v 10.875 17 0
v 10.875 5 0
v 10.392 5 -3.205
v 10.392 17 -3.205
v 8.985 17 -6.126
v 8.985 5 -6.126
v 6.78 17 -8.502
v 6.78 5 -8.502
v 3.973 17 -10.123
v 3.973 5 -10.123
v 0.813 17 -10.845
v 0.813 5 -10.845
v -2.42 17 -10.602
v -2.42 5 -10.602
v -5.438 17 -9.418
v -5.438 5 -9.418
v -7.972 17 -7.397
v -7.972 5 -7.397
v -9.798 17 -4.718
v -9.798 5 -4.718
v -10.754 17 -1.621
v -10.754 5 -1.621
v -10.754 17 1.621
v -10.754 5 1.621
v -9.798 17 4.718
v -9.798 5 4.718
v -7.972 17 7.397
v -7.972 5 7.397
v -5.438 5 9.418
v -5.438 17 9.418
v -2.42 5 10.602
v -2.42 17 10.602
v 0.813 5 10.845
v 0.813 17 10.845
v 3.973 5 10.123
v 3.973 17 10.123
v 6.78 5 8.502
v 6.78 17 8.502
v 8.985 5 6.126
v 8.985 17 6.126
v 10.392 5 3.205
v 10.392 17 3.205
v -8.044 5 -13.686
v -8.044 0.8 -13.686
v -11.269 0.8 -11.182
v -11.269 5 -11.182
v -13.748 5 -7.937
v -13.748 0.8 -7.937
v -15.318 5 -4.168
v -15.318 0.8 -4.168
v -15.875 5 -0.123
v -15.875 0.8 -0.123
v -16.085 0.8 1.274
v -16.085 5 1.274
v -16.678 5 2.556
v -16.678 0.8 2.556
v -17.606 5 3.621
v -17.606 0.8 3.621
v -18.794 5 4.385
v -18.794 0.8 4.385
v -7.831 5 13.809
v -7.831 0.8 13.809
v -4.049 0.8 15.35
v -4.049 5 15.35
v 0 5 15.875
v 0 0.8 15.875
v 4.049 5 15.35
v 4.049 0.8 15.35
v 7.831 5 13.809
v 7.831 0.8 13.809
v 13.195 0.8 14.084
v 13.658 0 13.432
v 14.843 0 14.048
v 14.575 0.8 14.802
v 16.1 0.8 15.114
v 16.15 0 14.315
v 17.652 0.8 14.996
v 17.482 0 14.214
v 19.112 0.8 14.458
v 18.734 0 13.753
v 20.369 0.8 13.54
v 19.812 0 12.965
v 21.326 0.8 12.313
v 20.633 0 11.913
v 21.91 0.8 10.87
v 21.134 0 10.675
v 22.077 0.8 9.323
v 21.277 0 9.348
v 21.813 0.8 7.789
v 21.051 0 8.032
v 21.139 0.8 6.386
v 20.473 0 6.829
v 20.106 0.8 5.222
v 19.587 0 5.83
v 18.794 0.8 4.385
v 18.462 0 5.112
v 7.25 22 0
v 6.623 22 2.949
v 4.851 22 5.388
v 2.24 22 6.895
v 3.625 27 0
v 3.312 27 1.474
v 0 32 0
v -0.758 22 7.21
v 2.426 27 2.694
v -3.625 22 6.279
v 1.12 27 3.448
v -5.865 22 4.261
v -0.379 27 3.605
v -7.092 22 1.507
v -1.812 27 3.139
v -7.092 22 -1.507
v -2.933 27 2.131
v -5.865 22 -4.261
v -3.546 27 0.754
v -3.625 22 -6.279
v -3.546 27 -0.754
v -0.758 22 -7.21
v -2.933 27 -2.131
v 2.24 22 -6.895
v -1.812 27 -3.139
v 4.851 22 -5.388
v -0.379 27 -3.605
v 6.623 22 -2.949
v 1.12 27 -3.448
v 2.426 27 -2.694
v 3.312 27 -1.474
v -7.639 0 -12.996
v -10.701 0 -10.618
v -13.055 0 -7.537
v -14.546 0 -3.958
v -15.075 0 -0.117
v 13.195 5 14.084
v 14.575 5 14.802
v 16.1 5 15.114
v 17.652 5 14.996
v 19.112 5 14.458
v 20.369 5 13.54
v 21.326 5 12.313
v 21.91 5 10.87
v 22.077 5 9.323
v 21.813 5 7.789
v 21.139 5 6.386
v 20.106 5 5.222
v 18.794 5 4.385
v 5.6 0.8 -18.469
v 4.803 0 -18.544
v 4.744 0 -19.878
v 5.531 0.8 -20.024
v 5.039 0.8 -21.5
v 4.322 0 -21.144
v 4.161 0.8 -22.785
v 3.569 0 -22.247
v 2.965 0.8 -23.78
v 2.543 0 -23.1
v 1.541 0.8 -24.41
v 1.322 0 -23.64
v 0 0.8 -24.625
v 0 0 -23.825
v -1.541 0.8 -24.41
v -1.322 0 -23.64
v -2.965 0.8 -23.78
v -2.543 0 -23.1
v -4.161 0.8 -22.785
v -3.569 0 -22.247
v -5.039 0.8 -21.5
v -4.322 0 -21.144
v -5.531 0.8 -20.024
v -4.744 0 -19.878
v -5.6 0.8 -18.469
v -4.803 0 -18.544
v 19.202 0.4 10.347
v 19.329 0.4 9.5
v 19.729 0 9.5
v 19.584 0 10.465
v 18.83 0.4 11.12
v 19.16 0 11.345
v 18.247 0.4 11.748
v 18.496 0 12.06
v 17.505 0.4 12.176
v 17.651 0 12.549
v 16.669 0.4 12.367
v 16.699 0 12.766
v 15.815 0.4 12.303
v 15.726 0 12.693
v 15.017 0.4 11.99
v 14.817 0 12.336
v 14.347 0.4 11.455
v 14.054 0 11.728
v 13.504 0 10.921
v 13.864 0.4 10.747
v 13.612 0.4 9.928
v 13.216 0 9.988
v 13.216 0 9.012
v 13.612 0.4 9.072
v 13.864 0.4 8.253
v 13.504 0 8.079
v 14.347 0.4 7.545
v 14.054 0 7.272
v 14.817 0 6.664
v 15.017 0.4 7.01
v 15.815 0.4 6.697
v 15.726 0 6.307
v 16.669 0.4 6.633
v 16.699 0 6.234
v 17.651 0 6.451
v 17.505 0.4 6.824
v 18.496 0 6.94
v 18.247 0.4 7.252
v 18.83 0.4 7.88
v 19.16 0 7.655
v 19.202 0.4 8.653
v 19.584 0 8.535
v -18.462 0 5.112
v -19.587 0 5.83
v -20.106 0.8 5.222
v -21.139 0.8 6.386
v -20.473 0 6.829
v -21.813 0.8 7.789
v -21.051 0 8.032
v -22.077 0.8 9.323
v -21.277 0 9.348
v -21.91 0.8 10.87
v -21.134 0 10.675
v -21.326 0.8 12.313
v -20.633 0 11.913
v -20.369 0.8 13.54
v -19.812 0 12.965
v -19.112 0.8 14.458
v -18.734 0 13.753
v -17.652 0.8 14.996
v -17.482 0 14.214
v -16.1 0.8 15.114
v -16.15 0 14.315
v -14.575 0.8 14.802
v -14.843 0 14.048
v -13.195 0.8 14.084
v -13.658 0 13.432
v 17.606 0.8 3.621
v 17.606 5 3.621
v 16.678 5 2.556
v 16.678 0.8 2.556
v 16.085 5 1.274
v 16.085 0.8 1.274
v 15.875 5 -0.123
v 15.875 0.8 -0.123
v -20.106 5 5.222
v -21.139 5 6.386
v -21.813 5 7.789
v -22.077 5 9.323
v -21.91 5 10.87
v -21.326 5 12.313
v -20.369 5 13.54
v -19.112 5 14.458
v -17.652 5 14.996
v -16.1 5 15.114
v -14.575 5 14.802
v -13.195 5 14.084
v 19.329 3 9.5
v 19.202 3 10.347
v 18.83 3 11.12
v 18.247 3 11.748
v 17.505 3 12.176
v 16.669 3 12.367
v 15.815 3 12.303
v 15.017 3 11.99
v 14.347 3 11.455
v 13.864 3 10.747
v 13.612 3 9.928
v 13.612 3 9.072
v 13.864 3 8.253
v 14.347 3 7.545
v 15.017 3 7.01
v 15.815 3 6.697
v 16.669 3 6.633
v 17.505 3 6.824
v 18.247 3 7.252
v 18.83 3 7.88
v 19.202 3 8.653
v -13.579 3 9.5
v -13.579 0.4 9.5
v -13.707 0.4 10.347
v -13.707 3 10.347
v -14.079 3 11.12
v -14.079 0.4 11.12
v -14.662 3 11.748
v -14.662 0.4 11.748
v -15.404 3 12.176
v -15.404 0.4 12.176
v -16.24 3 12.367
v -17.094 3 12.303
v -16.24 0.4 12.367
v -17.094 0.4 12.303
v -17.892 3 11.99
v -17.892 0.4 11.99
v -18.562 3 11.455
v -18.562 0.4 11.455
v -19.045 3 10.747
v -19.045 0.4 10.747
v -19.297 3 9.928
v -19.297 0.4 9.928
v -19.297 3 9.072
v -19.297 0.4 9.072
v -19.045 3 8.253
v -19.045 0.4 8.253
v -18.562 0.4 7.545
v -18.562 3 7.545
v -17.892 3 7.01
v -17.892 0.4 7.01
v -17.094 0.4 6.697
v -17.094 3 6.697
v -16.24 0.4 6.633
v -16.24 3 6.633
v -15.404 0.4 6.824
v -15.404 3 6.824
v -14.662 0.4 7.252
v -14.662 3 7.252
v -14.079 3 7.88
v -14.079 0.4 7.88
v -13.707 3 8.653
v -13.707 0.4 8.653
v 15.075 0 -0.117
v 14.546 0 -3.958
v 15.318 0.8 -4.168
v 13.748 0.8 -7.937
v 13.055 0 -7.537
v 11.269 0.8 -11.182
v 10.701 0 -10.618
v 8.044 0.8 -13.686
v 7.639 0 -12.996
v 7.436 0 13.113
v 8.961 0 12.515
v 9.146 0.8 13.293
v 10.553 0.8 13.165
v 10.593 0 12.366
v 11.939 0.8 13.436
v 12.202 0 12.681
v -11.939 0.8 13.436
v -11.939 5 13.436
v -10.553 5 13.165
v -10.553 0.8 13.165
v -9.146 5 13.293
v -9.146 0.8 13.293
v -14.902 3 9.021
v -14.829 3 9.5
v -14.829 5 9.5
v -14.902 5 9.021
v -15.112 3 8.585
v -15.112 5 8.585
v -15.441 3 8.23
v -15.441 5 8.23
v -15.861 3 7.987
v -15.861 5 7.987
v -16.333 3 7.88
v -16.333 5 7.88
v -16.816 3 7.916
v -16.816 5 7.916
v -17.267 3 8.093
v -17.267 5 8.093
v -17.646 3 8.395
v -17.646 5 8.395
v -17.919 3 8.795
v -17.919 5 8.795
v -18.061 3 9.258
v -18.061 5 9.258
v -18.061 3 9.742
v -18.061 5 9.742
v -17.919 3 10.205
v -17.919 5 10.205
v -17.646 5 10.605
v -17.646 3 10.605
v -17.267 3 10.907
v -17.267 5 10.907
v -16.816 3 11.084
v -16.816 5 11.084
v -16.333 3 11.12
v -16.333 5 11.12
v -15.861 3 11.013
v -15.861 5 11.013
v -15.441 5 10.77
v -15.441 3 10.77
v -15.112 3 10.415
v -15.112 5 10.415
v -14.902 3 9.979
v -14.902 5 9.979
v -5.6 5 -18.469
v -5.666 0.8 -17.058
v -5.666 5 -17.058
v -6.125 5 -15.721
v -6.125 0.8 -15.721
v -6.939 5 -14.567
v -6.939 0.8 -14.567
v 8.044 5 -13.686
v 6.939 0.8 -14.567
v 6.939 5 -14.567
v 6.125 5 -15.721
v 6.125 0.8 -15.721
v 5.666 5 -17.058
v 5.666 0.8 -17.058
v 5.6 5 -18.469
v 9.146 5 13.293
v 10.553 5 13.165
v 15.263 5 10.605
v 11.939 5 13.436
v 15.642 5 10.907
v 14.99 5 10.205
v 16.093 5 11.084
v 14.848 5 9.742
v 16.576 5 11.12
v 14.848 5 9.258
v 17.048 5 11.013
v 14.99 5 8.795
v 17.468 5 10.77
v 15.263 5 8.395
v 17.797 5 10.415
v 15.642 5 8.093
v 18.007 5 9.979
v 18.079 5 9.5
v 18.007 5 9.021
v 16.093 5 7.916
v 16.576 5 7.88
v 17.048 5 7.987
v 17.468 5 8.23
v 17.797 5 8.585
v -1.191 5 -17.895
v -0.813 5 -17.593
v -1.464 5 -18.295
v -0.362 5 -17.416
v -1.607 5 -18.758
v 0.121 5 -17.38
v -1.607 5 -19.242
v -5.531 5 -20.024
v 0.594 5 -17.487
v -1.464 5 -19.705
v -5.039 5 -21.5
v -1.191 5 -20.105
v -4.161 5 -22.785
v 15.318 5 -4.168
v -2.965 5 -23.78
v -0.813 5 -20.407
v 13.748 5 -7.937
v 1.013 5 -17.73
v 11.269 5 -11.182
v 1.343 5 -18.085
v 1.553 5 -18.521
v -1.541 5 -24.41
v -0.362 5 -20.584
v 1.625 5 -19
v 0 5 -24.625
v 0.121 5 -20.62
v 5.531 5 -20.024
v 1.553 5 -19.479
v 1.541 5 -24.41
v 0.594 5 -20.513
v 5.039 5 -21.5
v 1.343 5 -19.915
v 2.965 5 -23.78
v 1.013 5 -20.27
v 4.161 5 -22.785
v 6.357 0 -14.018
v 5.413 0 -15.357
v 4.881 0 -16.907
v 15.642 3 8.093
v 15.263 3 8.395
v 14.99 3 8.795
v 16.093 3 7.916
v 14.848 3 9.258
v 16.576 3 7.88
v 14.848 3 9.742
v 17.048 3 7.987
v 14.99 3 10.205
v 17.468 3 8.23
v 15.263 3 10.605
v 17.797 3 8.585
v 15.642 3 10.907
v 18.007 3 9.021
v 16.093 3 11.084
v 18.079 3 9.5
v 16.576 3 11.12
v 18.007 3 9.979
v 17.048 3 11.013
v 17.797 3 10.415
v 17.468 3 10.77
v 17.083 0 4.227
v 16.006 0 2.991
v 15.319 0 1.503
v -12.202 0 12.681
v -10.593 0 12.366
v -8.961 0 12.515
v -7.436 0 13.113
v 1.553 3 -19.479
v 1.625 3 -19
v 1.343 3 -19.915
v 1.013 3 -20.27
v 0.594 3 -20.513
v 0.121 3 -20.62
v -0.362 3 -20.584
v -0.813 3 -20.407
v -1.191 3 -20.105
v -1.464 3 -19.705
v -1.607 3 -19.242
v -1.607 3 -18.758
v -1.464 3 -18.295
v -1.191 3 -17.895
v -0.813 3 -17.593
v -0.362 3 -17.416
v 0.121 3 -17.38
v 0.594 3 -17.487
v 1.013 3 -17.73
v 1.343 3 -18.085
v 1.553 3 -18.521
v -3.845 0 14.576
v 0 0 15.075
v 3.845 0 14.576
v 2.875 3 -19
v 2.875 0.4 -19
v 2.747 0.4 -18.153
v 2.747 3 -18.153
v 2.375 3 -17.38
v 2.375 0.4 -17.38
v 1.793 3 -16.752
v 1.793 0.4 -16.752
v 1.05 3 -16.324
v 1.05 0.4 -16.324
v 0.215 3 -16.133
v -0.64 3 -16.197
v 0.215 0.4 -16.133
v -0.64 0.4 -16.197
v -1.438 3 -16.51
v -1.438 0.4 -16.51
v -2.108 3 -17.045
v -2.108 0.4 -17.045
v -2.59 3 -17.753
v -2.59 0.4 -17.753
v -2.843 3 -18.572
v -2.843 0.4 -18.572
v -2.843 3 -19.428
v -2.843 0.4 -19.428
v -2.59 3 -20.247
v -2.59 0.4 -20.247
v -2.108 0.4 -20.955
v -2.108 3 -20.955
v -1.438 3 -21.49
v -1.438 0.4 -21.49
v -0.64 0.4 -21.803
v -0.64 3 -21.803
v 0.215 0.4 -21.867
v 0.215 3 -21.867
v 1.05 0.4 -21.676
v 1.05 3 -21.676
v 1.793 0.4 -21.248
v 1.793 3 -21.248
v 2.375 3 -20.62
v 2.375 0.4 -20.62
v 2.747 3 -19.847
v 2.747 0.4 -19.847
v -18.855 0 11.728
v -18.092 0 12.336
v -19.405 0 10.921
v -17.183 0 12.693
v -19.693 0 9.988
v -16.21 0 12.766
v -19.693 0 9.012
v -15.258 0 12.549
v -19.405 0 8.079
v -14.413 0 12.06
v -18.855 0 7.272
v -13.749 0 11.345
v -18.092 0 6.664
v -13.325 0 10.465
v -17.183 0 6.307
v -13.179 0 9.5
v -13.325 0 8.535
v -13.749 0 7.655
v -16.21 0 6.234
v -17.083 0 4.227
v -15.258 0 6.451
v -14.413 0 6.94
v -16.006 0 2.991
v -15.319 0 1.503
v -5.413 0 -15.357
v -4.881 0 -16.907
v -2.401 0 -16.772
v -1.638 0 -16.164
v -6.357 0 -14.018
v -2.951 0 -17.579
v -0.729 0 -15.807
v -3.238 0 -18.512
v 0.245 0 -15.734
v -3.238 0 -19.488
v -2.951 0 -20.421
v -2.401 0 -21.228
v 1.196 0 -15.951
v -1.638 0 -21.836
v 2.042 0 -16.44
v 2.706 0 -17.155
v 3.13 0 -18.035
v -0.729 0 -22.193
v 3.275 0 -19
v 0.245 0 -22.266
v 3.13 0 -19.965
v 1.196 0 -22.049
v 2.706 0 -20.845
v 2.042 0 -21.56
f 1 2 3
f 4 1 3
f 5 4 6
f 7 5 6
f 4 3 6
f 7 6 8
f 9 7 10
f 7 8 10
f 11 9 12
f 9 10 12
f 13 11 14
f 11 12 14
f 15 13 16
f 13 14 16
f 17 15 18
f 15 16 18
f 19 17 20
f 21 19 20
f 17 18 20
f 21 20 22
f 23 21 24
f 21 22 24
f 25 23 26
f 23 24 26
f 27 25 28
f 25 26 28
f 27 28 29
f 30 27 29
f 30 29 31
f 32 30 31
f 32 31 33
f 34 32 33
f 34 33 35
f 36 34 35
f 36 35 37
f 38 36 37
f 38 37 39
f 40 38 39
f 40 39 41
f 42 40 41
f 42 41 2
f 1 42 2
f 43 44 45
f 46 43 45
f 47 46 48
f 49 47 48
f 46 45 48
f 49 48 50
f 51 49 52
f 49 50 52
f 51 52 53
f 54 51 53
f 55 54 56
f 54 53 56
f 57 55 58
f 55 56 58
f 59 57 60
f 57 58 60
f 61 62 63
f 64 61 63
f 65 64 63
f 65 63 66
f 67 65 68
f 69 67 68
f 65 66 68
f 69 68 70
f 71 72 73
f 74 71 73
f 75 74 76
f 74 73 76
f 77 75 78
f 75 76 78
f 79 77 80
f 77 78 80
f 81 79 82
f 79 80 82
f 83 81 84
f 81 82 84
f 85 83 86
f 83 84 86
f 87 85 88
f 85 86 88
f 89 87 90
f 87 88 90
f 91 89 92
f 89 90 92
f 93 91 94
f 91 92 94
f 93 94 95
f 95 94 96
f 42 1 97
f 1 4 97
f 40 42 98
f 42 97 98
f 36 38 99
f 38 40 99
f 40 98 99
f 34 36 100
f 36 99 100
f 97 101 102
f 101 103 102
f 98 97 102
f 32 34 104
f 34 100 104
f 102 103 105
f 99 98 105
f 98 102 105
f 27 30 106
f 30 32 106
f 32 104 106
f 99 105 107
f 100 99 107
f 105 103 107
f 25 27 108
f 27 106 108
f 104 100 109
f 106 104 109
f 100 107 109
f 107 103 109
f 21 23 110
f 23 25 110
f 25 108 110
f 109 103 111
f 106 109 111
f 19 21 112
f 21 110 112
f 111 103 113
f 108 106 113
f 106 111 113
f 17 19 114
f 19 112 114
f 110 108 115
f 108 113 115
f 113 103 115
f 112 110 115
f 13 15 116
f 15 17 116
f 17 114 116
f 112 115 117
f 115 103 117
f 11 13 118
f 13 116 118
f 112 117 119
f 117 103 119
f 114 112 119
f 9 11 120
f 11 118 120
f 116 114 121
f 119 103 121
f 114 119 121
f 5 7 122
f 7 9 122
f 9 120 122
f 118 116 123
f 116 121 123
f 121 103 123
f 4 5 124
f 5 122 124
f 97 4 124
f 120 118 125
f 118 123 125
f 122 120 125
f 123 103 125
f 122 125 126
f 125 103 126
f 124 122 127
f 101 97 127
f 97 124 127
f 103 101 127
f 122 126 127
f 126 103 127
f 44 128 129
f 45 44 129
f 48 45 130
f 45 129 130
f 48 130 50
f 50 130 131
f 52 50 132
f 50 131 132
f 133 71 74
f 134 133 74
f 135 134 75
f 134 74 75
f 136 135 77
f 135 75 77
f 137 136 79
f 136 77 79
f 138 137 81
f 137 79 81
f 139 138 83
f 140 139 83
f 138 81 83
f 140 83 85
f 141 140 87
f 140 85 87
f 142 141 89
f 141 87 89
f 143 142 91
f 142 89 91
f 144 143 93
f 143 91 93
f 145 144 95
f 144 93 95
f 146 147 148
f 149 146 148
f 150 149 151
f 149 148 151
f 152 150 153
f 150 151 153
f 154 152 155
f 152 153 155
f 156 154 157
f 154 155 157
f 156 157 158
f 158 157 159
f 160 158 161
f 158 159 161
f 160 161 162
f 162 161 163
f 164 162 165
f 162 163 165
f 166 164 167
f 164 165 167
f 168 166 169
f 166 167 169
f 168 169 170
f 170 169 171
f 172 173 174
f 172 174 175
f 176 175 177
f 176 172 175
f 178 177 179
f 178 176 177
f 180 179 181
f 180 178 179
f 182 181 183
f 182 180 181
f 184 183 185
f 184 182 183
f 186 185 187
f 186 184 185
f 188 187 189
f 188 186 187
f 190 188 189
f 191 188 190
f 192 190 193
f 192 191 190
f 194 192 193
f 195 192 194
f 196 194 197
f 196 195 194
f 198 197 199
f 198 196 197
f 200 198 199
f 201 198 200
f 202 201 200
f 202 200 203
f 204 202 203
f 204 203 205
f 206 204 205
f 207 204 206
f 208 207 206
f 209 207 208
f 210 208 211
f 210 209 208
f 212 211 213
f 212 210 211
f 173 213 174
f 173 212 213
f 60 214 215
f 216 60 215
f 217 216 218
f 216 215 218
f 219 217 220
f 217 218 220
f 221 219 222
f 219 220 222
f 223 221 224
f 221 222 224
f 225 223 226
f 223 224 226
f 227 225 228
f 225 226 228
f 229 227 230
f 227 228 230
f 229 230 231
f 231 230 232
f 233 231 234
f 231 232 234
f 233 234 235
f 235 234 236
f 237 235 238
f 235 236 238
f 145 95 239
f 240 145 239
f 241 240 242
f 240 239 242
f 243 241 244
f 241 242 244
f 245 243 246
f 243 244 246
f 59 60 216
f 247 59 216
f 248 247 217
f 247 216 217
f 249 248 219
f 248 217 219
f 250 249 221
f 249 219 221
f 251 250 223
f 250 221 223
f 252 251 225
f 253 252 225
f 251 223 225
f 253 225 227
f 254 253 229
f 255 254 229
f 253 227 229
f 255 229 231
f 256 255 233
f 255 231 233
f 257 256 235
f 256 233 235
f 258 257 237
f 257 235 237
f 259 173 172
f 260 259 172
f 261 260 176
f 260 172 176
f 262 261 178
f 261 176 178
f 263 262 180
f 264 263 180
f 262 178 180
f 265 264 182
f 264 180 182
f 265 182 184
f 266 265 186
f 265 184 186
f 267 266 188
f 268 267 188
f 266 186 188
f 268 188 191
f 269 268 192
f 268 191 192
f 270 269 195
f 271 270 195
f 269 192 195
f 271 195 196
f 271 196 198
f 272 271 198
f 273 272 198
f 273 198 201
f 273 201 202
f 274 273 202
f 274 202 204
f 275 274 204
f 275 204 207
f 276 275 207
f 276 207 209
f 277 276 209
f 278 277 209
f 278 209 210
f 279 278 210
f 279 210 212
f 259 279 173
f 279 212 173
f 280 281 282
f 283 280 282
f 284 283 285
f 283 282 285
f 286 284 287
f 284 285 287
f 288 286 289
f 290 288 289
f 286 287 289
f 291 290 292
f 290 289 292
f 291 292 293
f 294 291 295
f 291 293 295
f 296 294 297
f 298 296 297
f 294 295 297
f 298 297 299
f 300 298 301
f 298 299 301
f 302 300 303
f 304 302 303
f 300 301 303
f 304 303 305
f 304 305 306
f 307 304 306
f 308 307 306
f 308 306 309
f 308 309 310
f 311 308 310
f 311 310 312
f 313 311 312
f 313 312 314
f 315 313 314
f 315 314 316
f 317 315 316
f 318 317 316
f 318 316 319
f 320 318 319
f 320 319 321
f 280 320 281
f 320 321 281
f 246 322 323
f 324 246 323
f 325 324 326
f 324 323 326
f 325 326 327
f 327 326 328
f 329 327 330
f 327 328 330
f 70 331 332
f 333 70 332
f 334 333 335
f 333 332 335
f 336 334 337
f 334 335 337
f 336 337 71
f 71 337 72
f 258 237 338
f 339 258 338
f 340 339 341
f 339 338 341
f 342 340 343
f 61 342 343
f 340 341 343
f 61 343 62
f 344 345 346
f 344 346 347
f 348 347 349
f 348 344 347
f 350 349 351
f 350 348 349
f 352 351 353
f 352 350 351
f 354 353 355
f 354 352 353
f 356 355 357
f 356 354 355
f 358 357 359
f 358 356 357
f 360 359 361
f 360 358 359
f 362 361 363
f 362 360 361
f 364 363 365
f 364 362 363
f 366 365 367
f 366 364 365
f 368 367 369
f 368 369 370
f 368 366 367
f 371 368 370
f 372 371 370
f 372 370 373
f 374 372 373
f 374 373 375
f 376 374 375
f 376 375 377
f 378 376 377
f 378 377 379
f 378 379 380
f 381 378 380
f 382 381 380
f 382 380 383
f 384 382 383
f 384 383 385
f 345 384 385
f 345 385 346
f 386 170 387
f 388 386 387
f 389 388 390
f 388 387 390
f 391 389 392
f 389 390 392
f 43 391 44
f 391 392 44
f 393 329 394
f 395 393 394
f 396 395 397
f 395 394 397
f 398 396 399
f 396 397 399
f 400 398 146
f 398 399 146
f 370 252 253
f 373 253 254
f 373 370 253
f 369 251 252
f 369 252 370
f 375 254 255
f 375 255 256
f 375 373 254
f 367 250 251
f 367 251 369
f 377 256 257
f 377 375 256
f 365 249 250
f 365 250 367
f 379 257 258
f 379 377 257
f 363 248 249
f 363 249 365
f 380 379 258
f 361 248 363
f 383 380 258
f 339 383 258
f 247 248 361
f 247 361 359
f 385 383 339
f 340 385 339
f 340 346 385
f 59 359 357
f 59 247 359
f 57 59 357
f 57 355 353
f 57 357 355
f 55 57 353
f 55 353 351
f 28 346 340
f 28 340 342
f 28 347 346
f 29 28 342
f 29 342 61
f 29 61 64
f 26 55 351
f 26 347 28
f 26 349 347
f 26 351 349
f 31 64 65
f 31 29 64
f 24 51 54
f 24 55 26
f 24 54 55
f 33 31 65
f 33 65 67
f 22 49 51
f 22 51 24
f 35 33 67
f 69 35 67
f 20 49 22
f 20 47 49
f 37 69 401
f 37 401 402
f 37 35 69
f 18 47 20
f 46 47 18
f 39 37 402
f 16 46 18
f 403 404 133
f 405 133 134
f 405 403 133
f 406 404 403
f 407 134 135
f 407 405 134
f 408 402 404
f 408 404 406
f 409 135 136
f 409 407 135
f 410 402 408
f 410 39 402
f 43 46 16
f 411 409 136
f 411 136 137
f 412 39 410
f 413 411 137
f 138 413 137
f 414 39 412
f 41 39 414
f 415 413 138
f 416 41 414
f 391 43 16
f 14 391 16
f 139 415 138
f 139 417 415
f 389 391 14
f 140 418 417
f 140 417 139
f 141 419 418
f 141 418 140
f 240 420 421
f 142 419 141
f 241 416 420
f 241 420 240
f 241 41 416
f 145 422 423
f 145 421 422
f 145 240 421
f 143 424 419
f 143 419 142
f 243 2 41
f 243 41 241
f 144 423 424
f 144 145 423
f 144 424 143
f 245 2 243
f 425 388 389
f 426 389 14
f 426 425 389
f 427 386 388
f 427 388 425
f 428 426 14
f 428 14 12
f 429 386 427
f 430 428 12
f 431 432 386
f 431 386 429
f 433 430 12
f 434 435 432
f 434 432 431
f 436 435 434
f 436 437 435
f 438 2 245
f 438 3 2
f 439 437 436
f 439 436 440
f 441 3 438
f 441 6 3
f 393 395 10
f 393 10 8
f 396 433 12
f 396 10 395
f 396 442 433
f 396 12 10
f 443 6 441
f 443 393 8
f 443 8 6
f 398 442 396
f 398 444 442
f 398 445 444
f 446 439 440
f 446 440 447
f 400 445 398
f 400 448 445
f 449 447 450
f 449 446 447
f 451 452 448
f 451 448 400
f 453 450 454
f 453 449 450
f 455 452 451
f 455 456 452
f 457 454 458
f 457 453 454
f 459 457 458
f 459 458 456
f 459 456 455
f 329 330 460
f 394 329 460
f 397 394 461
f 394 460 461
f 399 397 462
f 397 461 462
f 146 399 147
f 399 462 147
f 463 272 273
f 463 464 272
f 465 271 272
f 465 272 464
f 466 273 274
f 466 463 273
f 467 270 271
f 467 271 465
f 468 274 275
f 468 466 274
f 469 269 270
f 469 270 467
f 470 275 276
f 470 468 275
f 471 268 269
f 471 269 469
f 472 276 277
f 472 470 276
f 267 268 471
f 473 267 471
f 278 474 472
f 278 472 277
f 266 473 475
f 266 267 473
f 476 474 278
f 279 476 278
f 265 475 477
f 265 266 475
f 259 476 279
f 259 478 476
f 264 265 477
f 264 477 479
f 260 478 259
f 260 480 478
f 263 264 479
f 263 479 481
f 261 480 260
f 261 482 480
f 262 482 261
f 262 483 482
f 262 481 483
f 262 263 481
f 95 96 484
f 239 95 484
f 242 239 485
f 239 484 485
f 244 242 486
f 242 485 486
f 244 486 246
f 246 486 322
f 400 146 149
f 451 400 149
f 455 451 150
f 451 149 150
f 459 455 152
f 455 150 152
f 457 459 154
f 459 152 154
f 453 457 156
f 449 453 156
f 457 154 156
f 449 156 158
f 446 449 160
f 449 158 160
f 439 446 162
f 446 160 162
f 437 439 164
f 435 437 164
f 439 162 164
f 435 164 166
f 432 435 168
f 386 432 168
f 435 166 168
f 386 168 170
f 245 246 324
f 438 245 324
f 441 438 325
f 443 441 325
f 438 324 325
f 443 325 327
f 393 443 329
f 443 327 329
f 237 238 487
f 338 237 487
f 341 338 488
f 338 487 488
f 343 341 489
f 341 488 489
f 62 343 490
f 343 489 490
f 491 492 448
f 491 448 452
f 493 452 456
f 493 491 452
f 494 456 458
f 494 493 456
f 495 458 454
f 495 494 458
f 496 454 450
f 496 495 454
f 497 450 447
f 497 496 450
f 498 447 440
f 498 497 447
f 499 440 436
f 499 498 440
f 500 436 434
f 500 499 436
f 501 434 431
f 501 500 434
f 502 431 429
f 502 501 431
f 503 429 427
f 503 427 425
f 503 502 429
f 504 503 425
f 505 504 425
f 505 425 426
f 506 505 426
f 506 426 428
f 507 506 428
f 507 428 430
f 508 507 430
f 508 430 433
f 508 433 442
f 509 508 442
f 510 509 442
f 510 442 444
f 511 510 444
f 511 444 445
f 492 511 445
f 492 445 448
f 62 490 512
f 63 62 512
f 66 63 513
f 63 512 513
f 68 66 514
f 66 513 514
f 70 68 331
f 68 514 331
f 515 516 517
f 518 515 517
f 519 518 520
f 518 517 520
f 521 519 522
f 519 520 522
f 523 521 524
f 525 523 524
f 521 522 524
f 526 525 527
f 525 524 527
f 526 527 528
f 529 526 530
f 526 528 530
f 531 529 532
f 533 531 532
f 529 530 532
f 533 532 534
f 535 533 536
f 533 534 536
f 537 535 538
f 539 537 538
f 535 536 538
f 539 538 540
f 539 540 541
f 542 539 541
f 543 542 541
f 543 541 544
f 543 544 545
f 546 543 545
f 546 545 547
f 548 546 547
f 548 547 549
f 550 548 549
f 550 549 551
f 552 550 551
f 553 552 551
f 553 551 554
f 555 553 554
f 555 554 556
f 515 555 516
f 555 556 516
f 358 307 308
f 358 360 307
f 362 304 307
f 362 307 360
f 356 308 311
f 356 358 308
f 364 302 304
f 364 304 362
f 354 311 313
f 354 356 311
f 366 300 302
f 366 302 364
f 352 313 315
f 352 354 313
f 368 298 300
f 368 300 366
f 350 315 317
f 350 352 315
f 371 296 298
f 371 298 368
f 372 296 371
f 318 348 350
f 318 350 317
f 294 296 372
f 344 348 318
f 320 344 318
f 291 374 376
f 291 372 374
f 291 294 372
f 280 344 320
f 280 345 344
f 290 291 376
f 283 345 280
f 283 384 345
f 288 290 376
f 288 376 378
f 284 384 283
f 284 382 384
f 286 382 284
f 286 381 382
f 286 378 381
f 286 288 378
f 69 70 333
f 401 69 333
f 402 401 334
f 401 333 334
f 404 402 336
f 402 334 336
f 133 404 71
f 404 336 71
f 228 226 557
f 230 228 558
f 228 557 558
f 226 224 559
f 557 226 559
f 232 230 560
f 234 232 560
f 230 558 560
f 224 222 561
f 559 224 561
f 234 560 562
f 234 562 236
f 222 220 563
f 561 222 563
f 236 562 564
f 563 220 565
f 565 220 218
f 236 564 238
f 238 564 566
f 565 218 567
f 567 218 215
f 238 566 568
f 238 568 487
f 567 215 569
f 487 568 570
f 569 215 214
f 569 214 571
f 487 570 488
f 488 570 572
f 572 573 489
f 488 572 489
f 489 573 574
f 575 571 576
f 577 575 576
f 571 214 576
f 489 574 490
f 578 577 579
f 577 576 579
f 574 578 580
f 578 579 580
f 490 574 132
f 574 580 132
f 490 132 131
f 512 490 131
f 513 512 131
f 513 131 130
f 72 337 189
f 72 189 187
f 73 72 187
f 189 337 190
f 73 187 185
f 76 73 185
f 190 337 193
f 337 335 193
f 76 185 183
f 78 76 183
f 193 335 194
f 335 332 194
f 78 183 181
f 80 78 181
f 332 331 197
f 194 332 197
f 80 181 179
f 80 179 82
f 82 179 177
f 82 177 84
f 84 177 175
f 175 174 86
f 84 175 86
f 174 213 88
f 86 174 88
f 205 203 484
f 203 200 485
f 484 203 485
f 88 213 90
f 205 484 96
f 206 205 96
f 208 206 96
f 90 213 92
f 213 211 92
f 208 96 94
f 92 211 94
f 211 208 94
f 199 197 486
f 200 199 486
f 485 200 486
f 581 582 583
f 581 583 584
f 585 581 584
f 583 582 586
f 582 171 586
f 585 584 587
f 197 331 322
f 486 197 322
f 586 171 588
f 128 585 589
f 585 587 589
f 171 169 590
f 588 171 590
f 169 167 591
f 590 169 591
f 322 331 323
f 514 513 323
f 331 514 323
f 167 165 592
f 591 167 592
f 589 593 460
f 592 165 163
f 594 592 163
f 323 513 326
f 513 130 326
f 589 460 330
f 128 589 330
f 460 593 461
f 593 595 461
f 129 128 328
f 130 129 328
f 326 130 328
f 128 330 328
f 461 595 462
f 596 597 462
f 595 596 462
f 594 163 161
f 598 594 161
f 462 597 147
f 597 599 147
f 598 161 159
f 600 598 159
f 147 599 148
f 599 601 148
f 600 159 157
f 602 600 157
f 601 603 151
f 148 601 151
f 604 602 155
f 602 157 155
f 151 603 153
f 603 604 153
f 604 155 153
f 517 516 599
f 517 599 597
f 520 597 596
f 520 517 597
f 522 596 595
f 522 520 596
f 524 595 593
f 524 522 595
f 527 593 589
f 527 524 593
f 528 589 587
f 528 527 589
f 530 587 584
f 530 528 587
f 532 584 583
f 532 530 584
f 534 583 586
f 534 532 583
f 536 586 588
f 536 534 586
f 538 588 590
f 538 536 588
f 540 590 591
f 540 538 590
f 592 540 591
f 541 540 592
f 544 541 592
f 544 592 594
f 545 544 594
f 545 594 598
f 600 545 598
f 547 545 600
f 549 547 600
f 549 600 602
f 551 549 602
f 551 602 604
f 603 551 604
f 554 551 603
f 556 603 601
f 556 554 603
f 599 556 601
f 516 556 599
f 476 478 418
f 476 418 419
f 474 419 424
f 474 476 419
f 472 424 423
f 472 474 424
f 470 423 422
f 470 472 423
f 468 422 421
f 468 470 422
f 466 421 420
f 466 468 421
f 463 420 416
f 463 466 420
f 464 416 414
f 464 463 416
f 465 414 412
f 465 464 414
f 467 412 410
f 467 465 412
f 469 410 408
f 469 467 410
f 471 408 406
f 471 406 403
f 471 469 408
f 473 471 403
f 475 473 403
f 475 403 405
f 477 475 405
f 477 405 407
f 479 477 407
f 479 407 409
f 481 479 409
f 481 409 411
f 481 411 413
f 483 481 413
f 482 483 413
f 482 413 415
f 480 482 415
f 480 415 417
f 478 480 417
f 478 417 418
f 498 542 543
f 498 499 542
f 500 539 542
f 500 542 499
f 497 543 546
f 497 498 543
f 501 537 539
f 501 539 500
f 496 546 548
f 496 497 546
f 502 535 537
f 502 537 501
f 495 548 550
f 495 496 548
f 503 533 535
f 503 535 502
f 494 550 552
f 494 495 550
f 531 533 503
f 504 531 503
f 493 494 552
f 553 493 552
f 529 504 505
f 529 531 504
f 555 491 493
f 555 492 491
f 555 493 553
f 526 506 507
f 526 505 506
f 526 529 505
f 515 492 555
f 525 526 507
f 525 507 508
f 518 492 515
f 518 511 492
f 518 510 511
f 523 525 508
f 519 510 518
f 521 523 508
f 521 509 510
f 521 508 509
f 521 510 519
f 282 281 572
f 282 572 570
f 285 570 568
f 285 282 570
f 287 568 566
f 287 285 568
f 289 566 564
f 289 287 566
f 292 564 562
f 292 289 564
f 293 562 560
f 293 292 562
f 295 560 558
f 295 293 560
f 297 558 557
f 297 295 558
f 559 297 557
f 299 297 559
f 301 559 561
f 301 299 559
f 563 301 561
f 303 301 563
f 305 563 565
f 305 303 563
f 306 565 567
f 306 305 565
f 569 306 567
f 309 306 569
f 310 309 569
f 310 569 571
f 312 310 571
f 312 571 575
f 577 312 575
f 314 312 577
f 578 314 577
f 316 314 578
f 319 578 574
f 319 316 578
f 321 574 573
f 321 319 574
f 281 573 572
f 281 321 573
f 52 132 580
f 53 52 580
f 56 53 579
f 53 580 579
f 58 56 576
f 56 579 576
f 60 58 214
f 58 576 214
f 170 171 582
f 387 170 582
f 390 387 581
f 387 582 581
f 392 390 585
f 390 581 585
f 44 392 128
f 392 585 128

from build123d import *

# Parameters (mm, degrees)
SKETCH1_R           = 10.875
SKETCH1_R_2         = 1.625
BOSS_EXTRUDE1_DEPTH = 5
SKETCH1_2_R         = 10.875
BOSS_EXTRUDE2_DEPTH = 17
CHAMFER1_SIZE       = 0.8
SKETCH3_R           = 2.875
CUT_EXTRUDE1_DEPTH  = 3
CHAMFER2_SIZE       = 0.4


with BuildPart() as part:
    # Sketch1 → Boss-Extrude1 (new body)
    with BuildSketch(Plane(origin=(0, 0, 0), x_dir=(1, 0, 0), z_dir=(0, 1, 0))):
        with BuildLine():
            ThreePointArc((5.599866179, 18.468846749), (0, 24.625), (-5.599866179, 18.468846749))
            ThreePointArc((-5.599866179, 18.468846749), (-6.125206634, 15.721438867), (-8.043986082, 13.686121179))
            ThreePointArc((-8.043986082, 13.686121179), (-13.748153285, 7.9375), (-15.874521661, 0.123235705))
            ThreePointArc((-15.874521661, 0.123235705), (-16.67776876, -2.556134885), (-18.794423553, -4.384797006))
            ThreePointArc((-18.794423553, -4.384797006), (-21.325875568, -12.3125), (-13.194557374, -14.084049744))
            ThreePointArc((-13.194557374, -14.084049744), (-10.552562126, -13.165303982), (-7.830535579, -13.809356884))
            ThreePointArc((-7.830535579, -13.809356884), (0, -15.875), (7.830535579, -13.809356884))
            ThreePointArc((7.830535579, -13.809356884), (10.552562126, -13.165303982), (13.194557374, -14.084049744))
            ThreePointArc((13.194557374, -14.084049744), (21.325875568, -12.3125), (18.794423553, -4.384797006))
            ThreePointArc((18.794423553, -4.384797006), (16.67776876, -2.556134885), (15.874521661, 0.123235705))
            ThreePointArc((15.874521661, 0.123235705), (13.748153285, 7.9375), (8.043986082, 13.686121179))
            ThreePointArc((8.043986082, 13.686121179), (6.125206634, 15.721438867), (5.599866179, 18.468846749))
        make_face()
        Circle(SKETCH1_R, mode=Mode.SUBTRACT)
        with Locations((0, 19)):
            Circle(SKETCH1_R_2, mode=Mode.SUBTRACT)
        with Locations((16.454482672, -9.5)):
            Circle(SKETCH1_R_2, mode=Mode.SUBTRACT)
        with Locations((-16.454482672, -9.5)):
            Circle(SKETCH1_R_2, mode=Mode.SUBTRACT)
    extrude(amount=BOSS_EXTRUDE1_DEPTH)

    # Sketch1<2> → Boss-Extrude2 (add)
    with BuildSketch(Plane(origin=(0, 0, 0), x_dir=(1, 0, 0), z_dir=(0, 1, 0))):
        Circle(SKETCH1_2_R)
    extrude(amount=BOSS_EXTRUDE2_DEPTH)

    # Sketch2 → Revolve1 (revolve)
    with BuildSketch(Plane.XY):
        Polygon((0, 17), (10.875, 17), (0, 32), align=None)
    revolve(axis=Axis((0, 18.413549721, 0), (0, -1, 0)))

    # Chamfer1
    chamfer1_edges = [part.edges().sort_by_distance(p)[0] for p in [
        (16.67776876, 0, 2.556134885),
        (21.325875568, 0, 12.3125),
        (10.552562126, 0, 13.165303982),
        (0, 0, 15.875),
        (-10.552562126, 0, 13.165303982),
        (-21.325875568, 0, 12.3125),
        (-16.67776876, 0, 2.556134885),
        (-13.748153285, 0, -7.9375),
        (-6.125206634, 0, -15.721438867),
        (0, 0, -24.625),
        (6.125206634, 0, -15.721438867),
        (13.748153285, 0, -7.9375),
    ]]
    chamfer(chamfer1_edges, length=CHAMFER1_SIZE)

    # Sketch3 → Cut-Extrude1 (cut)
    with BuildSketch(Plane.XZ):
        with Locations((0, -19)):
            Circle(SKETCH3_R)
        with Locations((-16.454482672, 9.5)):
            Circle(SKETCH3_R)
        with Locations((16.454482672, 9.5)):
            Circle(SKETCH3_R)
    extrude(amount=-CUT_EXTRUDE1_DEPTH, mode=Mode.SUBTRACT)

    # Chamfer2
    chamfer2_edges = [part.edges().sort_by_distance(p)[0] for p in [
        (-2.875, 0, -19),
        (-19.329482672, 0, 9.5),
        (13.579482672, 0, 9.5),
    ]]
    chamfer(chamfer2_edges, length=CHAMFER2_SIZE)


solid = part.part
